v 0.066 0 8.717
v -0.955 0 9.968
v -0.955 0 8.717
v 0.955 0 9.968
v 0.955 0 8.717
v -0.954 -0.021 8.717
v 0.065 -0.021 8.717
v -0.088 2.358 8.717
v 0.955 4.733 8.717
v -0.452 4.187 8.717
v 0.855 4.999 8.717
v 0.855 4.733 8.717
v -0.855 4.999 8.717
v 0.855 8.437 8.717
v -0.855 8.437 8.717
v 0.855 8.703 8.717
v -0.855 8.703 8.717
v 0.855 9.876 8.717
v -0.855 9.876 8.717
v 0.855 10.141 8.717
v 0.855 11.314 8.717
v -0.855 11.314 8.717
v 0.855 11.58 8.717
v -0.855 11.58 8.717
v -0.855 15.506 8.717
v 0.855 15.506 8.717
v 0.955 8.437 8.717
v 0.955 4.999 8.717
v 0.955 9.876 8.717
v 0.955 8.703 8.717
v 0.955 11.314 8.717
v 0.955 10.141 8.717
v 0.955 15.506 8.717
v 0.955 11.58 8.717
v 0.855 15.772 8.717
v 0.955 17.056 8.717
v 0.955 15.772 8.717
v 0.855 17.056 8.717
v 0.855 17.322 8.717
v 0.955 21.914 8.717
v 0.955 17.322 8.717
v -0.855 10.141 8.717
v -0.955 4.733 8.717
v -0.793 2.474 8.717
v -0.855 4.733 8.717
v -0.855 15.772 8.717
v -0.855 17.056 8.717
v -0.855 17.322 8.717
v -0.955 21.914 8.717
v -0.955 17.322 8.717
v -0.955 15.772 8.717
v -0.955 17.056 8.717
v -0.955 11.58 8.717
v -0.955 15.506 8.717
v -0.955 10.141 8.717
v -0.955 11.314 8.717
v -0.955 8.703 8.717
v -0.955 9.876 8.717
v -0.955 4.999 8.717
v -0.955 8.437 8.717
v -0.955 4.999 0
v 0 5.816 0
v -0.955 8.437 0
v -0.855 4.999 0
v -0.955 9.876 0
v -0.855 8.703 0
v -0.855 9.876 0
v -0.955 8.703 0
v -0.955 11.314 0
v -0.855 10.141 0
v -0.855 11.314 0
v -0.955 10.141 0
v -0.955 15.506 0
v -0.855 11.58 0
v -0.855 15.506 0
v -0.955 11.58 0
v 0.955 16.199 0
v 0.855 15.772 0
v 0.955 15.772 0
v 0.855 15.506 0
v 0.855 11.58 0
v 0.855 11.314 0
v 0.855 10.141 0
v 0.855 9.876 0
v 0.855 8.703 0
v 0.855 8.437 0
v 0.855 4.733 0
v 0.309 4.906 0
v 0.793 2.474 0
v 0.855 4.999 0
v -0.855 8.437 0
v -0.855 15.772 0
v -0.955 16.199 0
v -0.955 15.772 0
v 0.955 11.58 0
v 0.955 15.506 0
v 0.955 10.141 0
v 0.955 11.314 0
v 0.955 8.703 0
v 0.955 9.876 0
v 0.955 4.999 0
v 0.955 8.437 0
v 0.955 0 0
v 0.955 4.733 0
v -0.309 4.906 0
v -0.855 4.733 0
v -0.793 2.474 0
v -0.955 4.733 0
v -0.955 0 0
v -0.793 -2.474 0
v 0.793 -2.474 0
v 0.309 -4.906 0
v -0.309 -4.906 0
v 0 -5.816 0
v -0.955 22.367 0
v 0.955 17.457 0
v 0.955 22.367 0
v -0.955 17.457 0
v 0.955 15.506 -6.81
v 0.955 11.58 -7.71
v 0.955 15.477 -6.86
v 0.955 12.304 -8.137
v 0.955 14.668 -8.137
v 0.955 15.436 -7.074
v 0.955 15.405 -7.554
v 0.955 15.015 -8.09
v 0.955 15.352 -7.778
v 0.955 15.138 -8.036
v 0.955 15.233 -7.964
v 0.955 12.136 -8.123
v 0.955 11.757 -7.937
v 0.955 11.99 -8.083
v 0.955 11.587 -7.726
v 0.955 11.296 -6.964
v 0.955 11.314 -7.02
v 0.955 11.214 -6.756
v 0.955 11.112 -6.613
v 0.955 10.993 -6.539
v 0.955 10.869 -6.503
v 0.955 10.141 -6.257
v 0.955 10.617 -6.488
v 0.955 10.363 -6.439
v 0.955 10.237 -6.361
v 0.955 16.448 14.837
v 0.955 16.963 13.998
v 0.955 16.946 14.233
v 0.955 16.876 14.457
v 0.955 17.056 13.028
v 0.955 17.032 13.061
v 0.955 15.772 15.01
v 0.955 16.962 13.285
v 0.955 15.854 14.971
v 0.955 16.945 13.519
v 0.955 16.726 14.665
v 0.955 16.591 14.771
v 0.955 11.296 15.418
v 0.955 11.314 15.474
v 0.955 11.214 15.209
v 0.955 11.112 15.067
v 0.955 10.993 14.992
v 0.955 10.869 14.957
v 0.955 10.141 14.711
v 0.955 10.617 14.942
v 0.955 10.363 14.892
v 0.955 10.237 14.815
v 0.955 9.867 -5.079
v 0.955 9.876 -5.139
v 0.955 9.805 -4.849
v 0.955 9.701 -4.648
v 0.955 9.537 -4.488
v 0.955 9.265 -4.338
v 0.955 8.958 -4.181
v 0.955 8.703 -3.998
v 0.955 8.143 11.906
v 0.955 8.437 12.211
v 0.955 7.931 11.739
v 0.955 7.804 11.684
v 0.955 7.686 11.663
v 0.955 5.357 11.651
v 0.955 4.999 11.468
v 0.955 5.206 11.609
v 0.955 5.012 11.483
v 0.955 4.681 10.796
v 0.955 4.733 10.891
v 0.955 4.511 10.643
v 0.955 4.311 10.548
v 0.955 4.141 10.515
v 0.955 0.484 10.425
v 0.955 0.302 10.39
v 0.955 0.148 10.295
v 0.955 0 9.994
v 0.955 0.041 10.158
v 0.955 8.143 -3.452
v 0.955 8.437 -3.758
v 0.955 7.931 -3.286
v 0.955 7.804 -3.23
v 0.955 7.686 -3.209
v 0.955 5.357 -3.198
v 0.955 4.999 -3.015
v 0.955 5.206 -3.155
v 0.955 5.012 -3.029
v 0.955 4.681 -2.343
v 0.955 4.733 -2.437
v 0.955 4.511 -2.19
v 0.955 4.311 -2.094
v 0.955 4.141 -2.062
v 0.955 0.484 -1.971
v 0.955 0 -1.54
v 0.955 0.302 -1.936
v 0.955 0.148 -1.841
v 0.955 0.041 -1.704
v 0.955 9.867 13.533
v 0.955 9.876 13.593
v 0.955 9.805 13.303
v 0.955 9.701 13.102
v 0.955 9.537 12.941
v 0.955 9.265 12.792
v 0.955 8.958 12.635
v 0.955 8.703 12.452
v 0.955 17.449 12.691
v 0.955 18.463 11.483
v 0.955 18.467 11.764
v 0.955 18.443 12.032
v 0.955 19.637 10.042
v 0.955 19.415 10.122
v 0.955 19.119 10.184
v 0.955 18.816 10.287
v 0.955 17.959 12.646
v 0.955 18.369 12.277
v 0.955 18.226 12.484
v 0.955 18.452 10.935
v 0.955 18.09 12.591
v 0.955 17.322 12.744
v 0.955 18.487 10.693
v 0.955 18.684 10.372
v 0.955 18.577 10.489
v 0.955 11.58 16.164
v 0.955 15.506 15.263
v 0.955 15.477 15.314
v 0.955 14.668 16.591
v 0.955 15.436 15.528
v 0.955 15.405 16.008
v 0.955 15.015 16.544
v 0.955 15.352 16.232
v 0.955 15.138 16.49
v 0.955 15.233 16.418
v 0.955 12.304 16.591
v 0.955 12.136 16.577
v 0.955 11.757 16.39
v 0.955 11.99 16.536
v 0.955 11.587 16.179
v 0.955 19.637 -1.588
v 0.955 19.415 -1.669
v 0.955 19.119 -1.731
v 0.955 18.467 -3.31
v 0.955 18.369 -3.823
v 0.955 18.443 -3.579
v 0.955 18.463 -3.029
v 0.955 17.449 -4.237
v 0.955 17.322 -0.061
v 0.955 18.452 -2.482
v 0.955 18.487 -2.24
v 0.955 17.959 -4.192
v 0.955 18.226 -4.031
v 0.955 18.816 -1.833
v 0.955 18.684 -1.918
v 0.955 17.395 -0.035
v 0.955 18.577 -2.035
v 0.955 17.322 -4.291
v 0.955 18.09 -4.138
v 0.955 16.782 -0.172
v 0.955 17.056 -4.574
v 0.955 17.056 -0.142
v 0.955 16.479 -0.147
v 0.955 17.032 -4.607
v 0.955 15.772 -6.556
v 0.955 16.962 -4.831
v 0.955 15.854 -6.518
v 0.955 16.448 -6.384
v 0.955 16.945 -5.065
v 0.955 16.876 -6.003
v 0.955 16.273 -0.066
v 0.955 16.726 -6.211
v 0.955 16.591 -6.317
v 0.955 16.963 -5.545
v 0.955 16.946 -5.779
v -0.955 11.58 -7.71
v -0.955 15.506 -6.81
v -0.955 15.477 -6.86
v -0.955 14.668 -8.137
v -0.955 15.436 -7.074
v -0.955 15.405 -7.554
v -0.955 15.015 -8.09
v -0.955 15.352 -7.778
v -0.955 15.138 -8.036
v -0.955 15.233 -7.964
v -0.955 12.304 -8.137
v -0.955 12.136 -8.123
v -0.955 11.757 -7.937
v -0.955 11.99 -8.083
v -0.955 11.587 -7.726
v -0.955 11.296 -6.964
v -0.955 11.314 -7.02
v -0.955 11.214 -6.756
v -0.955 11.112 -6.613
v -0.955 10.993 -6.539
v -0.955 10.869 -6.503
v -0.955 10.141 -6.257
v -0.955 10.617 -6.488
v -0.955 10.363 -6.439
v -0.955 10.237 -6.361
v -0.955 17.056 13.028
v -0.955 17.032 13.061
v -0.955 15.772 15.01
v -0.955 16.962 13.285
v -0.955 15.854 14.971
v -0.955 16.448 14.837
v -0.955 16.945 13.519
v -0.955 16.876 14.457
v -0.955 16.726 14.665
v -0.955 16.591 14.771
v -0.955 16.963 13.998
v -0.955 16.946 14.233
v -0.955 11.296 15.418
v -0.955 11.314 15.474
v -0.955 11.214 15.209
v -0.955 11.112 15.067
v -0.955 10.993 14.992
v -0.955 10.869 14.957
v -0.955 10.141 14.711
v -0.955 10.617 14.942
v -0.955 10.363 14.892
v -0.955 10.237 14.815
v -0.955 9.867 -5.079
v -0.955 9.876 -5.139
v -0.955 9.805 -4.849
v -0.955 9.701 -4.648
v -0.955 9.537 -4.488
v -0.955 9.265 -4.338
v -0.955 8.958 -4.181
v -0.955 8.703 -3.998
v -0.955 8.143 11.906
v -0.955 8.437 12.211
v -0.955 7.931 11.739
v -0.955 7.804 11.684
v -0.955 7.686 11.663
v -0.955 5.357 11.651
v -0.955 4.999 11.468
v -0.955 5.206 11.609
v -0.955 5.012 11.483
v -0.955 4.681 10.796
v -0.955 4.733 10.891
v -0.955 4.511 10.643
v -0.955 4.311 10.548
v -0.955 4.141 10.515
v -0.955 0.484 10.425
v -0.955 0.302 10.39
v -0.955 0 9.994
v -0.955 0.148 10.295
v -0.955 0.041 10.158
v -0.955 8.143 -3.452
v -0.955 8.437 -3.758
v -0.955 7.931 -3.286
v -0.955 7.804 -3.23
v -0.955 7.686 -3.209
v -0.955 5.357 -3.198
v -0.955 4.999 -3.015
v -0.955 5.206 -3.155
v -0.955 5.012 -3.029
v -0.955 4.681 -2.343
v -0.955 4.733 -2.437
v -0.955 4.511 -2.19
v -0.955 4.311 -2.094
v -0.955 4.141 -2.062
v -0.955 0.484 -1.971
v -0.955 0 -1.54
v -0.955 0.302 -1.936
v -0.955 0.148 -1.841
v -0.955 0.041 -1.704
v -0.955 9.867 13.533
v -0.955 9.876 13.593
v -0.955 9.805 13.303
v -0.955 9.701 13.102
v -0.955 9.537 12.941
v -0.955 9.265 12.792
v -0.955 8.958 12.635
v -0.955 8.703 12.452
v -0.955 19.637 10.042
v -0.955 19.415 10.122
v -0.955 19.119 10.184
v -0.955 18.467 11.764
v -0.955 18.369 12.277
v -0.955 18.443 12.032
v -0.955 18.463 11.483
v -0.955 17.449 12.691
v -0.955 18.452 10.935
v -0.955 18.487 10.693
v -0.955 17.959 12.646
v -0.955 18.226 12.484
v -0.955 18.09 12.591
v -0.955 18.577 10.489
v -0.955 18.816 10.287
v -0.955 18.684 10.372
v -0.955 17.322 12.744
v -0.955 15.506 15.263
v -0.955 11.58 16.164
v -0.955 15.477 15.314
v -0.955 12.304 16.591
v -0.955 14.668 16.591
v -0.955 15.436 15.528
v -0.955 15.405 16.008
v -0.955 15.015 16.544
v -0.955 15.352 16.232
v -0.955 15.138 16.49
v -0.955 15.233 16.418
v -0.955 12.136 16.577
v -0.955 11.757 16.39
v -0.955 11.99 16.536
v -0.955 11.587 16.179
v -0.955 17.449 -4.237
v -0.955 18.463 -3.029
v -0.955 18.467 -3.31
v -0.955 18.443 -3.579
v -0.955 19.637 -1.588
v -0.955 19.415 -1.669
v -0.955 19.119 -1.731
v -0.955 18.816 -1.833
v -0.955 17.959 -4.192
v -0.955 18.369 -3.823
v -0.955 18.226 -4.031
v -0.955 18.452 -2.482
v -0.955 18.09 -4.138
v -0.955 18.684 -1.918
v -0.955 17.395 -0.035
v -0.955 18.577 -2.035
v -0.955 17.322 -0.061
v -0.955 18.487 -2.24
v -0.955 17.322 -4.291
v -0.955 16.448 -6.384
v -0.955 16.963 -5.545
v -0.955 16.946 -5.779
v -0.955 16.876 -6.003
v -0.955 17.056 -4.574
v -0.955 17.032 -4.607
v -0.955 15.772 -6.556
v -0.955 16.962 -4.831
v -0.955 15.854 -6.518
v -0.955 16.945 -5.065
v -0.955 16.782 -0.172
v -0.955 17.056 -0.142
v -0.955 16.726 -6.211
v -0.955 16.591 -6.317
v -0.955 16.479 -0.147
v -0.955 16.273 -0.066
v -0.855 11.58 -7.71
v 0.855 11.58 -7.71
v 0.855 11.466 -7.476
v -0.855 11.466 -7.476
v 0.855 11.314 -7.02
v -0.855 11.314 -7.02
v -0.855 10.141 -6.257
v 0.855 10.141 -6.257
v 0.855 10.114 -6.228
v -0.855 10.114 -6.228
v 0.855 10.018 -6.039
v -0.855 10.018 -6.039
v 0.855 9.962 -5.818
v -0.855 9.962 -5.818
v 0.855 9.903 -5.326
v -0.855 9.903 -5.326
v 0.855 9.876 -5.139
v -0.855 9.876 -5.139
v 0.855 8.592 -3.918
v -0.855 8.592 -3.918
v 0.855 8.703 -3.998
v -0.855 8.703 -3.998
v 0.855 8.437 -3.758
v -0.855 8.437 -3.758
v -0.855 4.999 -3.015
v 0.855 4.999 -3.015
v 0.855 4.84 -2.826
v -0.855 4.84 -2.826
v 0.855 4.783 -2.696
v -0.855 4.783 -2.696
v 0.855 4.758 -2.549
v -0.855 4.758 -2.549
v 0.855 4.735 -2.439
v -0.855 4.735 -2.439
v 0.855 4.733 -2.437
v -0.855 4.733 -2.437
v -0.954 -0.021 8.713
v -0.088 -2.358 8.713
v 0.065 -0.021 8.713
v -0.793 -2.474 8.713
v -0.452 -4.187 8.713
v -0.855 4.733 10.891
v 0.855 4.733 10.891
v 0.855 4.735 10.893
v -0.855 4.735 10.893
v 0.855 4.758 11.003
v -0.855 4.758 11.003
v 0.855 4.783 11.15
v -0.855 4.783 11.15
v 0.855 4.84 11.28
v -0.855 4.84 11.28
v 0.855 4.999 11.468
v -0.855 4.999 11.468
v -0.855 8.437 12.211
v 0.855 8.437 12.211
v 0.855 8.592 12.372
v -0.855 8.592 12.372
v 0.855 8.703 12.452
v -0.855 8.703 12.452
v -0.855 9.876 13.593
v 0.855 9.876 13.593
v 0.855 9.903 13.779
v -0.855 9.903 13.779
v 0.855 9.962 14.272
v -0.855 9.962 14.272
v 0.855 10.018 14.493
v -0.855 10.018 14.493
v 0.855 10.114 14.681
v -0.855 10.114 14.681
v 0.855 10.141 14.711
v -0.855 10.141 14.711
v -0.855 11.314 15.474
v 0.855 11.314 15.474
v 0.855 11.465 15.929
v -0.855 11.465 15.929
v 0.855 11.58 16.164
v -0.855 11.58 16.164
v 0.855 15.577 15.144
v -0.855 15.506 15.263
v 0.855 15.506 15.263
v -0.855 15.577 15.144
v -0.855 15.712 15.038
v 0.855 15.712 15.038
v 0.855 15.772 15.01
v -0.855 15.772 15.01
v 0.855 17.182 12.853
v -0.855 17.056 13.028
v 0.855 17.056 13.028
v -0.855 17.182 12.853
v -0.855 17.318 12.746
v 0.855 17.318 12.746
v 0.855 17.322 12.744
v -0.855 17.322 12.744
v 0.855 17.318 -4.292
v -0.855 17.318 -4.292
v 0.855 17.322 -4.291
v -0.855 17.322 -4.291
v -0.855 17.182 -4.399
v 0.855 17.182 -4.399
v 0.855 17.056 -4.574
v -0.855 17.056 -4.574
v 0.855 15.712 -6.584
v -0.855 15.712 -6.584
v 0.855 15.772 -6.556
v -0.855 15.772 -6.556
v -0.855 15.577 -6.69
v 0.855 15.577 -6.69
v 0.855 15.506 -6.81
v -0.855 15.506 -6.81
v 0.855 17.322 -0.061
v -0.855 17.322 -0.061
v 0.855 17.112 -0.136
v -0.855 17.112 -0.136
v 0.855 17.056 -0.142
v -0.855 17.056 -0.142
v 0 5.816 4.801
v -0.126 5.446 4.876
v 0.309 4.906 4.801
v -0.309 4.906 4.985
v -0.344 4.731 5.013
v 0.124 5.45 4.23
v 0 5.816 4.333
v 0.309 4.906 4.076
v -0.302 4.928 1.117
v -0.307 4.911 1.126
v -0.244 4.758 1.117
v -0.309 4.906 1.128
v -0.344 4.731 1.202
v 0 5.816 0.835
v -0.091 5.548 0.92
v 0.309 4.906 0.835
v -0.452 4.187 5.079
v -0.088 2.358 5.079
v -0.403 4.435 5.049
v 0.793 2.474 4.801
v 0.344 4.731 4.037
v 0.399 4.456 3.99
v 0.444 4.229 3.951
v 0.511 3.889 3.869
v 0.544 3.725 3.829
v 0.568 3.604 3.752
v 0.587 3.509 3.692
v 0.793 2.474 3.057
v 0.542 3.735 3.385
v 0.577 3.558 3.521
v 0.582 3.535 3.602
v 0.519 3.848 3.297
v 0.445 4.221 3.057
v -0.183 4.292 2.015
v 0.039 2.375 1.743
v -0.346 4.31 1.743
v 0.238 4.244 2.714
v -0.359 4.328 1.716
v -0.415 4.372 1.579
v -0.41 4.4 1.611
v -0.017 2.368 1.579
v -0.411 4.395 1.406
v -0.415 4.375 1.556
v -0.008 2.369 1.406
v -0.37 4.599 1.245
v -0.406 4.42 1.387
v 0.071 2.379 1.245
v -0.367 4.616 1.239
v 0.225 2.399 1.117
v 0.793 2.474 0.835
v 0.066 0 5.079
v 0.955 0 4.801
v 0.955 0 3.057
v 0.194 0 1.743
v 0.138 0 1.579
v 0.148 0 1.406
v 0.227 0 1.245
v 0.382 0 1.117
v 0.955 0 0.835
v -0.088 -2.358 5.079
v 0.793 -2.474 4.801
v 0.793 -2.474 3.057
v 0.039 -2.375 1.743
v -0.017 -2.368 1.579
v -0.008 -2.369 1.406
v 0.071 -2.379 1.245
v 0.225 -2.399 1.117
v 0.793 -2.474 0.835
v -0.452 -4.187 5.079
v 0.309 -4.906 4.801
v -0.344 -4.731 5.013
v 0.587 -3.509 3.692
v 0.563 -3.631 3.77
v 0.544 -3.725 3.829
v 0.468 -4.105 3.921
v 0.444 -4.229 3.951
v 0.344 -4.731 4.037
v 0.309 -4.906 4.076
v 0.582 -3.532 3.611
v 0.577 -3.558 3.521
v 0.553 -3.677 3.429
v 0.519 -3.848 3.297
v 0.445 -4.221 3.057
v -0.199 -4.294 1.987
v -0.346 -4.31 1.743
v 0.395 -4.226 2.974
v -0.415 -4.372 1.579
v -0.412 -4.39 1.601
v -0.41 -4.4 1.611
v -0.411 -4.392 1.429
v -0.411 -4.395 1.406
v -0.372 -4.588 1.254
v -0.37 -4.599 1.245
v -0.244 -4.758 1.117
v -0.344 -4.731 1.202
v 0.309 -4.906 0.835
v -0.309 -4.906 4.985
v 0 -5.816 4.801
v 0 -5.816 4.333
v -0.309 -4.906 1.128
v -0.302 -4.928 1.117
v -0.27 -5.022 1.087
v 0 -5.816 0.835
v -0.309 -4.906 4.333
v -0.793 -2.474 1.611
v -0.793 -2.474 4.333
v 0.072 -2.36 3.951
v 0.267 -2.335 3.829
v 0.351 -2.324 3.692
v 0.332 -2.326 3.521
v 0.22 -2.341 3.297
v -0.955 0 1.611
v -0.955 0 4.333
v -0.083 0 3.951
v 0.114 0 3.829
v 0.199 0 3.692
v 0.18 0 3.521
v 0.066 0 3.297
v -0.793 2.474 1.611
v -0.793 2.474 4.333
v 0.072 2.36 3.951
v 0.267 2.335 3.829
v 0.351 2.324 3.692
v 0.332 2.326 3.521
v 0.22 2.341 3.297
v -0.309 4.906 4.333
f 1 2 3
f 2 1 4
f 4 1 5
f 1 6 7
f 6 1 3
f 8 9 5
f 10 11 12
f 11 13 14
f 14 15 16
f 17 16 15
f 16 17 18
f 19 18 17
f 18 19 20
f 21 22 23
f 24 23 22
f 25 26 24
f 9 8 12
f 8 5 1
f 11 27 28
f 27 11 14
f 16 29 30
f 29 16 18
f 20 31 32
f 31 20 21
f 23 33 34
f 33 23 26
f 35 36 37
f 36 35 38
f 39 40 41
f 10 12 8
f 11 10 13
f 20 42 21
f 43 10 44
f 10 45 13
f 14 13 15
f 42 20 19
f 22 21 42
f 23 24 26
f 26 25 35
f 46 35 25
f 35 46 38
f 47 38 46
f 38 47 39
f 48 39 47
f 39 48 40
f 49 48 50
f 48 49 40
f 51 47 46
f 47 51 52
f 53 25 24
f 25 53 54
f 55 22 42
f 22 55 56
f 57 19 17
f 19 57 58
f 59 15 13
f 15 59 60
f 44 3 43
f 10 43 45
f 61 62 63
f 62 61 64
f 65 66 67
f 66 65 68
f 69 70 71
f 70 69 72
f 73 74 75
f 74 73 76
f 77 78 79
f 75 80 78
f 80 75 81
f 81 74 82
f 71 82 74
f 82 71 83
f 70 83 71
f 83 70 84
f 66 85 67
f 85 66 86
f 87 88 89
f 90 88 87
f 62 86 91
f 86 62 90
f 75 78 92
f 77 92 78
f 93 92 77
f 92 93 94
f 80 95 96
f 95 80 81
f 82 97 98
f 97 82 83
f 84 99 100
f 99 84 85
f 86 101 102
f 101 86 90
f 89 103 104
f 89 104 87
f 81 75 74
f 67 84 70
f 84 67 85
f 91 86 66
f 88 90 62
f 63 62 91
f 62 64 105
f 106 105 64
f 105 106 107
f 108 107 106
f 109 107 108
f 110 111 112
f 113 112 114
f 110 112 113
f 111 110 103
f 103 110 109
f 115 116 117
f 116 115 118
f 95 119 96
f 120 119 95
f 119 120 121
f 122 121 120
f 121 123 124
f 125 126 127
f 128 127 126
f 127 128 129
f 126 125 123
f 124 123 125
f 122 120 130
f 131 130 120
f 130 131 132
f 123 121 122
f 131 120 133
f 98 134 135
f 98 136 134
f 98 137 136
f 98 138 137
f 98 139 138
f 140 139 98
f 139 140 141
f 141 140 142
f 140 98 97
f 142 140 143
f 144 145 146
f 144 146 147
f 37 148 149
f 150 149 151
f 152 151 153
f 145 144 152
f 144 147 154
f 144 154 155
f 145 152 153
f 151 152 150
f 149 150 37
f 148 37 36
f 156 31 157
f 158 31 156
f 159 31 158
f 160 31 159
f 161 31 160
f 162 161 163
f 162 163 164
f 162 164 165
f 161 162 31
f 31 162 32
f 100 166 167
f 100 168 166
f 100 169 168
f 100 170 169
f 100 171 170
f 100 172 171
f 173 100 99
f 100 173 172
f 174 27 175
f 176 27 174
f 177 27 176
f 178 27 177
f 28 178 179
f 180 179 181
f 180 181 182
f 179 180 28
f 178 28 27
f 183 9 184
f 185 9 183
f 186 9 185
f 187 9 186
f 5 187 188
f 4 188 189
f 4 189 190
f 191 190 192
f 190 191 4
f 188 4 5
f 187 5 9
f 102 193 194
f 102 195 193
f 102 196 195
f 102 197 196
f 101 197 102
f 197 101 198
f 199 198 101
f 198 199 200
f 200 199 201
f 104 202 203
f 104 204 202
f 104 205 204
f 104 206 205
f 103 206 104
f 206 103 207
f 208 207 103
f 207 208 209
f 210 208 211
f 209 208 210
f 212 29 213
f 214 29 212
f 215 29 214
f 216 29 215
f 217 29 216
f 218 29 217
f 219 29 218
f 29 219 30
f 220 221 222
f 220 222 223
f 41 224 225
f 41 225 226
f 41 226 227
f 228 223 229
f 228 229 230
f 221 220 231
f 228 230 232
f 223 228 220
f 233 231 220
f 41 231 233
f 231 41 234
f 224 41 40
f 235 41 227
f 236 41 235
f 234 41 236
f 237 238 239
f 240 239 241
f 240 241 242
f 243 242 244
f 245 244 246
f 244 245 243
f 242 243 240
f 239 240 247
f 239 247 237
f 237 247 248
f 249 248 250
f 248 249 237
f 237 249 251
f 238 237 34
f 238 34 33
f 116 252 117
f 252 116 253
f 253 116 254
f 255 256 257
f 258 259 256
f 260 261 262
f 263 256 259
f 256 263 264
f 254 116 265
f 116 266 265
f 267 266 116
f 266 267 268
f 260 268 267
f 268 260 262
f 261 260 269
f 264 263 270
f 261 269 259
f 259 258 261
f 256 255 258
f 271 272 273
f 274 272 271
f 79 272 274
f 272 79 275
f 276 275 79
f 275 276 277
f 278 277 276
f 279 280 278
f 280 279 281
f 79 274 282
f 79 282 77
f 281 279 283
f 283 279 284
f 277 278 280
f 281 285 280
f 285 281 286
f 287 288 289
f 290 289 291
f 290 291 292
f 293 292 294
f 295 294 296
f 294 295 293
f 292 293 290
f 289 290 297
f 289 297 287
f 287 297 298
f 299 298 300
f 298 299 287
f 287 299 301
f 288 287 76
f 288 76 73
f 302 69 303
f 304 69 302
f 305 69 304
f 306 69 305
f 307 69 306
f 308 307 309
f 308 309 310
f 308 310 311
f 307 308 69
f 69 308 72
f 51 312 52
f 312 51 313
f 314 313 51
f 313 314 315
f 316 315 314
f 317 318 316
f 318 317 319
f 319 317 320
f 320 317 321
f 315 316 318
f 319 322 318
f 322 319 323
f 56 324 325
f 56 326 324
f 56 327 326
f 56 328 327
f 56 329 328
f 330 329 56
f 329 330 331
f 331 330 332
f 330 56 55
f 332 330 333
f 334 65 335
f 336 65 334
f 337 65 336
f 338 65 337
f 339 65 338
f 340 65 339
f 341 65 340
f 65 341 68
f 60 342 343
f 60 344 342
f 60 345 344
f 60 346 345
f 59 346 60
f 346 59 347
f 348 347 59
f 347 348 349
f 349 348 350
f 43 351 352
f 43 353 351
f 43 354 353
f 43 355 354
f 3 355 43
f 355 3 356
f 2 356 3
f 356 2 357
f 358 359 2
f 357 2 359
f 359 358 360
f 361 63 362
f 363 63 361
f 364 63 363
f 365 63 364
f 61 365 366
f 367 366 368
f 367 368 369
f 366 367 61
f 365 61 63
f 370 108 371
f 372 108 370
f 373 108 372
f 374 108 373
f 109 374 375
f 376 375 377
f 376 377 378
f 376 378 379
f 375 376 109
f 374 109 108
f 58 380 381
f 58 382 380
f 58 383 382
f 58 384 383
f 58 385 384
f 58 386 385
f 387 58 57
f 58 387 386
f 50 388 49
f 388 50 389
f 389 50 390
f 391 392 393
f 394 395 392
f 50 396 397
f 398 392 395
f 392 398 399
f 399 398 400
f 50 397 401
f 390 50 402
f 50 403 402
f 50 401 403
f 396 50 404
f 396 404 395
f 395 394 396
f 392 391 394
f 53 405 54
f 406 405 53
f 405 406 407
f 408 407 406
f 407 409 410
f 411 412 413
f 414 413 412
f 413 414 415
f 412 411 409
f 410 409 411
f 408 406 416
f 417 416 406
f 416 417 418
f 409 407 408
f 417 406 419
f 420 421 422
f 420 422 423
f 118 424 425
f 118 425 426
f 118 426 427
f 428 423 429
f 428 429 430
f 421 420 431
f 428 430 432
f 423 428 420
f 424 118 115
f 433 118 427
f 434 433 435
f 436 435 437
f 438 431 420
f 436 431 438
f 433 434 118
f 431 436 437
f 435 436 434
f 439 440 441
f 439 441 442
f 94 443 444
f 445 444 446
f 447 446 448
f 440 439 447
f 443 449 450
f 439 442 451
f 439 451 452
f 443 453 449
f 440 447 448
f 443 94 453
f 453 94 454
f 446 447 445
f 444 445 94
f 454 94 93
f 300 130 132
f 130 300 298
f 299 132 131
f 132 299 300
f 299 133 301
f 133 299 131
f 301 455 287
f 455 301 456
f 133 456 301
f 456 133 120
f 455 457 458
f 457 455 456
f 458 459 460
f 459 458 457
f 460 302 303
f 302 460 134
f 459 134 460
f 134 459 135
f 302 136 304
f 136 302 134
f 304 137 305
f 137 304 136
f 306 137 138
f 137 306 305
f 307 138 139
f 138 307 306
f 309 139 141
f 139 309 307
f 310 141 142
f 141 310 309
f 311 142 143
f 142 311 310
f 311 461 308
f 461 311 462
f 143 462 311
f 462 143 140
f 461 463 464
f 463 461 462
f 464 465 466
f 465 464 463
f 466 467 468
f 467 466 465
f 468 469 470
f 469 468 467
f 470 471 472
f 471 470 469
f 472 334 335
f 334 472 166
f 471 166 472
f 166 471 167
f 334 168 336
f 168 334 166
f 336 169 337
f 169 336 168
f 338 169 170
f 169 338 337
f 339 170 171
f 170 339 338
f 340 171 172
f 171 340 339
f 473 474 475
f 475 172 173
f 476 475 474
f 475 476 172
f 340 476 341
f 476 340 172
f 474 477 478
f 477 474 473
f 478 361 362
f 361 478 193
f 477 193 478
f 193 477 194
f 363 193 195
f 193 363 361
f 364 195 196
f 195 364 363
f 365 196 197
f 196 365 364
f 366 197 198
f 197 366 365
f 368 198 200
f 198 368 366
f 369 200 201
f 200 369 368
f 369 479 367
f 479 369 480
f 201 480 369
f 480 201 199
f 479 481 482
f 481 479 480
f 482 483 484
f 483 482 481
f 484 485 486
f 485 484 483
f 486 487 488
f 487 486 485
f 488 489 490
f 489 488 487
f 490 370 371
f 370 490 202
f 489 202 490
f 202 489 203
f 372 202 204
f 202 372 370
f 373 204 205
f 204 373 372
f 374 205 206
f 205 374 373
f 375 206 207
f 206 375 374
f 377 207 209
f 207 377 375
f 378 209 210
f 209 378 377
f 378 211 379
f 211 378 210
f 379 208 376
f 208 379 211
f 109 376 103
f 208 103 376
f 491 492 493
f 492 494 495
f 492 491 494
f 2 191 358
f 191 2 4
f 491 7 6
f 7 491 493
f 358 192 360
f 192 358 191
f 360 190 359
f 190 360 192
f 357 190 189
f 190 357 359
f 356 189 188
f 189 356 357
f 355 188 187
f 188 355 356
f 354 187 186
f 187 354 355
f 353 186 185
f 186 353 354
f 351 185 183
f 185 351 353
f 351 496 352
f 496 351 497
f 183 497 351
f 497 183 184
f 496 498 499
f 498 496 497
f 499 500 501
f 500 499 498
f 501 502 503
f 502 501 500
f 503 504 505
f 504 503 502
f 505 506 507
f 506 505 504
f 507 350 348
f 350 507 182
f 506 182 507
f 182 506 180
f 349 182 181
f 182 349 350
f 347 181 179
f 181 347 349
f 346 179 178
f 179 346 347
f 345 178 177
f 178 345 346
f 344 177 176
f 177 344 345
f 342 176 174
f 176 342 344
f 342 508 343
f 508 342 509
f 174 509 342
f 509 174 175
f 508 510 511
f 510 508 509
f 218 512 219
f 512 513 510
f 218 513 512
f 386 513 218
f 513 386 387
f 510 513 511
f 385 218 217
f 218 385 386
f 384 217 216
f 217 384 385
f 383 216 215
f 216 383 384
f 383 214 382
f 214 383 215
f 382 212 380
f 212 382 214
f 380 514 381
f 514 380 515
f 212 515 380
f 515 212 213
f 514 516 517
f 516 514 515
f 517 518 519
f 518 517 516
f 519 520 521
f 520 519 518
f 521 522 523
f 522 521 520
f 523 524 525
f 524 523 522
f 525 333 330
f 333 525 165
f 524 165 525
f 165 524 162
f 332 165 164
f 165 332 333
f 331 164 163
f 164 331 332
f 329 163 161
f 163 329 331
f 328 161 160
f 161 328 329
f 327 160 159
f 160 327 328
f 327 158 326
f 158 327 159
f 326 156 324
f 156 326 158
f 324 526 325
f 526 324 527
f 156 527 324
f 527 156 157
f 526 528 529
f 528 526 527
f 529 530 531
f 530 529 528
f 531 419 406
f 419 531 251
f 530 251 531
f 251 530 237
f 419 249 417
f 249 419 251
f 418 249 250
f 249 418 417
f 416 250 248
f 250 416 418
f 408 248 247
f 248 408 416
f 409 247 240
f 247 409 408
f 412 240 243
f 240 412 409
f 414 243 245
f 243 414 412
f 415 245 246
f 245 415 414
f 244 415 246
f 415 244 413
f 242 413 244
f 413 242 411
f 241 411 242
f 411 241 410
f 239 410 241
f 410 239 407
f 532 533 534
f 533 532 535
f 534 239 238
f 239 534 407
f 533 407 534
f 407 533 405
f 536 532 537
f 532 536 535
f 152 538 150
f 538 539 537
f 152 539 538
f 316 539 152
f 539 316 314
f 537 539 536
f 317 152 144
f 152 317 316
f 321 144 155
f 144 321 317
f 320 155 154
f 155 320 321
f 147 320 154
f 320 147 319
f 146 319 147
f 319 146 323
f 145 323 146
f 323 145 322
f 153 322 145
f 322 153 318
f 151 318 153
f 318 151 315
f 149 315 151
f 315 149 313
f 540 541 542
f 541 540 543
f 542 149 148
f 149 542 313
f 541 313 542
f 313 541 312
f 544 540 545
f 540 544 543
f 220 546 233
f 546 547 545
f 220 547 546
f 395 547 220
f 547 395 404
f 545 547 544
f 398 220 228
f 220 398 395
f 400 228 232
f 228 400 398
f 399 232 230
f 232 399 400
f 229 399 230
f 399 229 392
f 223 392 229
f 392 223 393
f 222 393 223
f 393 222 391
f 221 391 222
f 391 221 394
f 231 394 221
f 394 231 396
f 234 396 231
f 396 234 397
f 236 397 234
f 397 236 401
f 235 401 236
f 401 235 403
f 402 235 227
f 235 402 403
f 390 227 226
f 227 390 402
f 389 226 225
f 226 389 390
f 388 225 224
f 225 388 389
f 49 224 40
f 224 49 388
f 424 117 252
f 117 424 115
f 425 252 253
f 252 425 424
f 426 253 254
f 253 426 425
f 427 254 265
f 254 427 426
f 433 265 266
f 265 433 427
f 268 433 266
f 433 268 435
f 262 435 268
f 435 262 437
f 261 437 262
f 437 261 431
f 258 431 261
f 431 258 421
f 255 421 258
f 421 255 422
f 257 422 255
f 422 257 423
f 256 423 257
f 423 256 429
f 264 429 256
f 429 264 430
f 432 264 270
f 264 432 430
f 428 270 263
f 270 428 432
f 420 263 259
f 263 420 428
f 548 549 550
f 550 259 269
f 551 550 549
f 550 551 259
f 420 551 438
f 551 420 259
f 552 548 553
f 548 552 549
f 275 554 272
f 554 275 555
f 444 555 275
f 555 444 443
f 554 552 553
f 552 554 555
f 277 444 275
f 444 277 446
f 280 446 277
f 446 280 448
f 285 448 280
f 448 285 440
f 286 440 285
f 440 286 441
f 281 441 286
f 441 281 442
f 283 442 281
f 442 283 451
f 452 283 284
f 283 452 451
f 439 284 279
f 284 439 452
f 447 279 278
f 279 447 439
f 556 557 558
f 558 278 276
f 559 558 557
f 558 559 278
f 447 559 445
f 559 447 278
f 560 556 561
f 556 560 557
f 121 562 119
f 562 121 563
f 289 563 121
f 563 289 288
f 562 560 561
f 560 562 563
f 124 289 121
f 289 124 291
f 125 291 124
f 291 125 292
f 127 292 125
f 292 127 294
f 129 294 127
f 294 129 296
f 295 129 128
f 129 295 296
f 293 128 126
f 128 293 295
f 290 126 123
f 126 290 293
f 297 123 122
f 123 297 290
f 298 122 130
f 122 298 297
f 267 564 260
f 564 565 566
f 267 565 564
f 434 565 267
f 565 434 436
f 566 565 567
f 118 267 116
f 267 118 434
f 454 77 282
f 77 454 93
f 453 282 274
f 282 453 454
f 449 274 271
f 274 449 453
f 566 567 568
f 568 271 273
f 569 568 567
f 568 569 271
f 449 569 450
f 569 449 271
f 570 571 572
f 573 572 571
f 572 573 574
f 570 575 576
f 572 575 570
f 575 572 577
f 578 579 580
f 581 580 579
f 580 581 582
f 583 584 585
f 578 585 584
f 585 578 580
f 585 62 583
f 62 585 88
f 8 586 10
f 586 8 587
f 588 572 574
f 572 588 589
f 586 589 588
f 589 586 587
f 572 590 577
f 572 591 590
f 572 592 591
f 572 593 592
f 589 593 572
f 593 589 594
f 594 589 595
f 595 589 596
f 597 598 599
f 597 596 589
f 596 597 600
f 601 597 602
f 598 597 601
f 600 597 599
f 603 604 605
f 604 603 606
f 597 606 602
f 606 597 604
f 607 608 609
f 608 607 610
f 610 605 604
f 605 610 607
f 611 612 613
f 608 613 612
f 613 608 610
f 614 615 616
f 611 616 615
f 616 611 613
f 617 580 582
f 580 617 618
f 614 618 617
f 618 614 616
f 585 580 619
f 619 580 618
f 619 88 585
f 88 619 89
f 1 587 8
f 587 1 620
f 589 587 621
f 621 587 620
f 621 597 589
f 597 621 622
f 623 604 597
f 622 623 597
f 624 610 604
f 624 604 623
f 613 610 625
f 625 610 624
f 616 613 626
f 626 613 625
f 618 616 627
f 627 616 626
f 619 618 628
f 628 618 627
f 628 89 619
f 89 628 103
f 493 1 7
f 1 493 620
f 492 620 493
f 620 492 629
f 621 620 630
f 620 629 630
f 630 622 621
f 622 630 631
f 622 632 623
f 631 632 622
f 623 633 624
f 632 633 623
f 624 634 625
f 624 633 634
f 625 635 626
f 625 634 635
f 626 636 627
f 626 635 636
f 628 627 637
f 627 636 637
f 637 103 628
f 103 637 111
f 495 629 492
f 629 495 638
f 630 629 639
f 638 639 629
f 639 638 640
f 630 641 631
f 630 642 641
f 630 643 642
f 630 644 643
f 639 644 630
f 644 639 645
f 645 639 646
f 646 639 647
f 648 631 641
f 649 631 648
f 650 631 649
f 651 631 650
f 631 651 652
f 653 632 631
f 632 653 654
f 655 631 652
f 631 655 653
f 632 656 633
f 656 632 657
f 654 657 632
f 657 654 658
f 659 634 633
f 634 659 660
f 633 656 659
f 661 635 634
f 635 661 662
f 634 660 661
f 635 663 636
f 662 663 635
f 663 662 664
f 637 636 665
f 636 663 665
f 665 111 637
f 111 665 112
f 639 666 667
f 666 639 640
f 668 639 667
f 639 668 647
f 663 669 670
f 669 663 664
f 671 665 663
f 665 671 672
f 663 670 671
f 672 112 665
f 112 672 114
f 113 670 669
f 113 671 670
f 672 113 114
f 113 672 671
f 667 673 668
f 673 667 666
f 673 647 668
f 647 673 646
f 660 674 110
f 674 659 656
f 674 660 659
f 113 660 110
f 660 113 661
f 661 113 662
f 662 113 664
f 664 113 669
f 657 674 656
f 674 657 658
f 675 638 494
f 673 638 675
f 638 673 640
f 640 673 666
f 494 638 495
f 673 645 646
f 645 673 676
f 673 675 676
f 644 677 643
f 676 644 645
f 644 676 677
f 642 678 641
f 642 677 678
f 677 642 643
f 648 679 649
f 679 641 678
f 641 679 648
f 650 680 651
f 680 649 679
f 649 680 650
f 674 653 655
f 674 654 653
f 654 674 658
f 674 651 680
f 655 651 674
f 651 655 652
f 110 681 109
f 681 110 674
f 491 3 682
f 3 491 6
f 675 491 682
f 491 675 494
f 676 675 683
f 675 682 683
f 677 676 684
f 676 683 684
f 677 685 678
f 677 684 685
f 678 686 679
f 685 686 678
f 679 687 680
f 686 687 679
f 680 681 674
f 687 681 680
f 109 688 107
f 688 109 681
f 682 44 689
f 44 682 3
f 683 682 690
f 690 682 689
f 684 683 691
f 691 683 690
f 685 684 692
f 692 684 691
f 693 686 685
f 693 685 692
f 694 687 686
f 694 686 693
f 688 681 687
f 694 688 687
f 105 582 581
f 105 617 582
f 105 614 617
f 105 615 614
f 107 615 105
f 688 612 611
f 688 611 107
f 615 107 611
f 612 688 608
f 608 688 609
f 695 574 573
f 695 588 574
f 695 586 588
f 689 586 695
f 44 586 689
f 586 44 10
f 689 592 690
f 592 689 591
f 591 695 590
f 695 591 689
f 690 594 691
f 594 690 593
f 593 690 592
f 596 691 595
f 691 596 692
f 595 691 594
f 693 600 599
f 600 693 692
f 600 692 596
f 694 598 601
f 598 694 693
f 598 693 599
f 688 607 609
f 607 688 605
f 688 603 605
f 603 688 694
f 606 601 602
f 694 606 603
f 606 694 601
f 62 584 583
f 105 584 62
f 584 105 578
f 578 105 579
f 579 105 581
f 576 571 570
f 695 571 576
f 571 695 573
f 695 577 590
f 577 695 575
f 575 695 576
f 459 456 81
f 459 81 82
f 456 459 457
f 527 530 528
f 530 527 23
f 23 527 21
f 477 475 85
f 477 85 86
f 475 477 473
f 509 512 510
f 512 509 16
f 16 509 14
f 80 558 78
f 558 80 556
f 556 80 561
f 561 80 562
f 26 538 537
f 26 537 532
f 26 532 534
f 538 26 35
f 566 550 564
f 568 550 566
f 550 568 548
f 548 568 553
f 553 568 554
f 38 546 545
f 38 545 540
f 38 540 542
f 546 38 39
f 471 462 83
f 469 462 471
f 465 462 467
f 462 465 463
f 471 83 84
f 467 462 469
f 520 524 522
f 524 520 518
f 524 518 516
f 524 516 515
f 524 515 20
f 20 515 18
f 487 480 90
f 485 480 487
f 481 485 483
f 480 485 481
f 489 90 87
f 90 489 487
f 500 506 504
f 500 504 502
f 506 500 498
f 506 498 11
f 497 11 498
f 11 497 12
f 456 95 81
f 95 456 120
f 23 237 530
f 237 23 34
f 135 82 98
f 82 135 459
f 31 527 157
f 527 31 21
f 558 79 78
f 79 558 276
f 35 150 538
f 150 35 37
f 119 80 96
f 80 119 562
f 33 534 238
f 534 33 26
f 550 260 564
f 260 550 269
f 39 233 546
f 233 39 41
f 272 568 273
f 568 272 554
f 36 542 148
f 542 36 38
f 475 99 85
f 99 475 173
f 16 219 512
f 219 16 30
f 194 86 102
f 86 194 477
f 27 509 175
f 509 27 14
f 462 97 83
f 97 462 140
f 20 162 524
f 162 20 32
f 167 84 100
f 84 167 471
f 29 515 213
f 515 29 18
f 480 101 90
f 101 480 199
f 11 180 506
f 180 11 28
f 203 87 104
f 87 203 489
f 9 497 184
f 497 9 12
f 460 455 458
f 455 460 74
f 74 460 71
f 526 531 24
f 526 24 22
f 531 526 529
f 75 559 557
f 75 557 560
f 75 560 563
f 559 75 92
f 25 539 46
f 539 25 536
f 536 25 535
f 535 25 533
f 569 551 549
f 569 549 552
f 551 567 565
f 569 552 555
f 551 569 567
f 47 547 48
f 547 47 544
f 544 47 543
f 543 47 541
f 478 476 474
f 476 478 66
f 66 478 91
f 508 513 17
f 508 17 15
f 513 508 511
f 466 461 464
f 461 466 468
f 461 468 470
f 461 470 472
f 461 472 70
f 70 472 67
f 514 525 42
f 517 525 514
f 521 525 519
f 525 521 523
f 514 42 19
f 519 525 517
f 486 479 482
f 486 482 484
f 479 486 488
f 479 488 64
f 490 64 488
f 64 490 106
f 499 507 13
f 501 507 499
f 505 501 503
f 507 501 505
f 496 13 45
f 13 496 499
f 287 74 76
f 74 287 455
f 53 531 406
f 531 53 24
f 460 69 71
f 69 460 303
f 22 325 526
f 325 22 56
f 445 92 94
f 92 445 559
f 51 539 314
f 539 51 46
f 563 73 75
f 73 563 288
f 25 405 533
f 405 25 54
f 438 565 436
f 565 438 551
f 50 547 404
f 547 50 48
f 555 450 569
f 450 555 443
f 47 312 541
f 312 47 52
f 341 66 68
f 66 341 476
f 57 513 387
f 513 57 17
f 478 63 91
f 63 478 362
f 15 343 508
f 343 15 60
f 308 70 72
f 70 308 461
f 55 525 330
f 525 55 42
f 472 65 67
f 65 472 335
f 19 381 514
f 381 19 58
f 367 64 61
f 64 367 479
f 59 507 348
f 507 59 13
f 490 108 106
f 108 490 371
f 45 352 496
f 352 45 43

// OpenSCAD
// file: keygen.scad
$inf=1000;
$eps=.01;

function key_move(points, offset) = [
    for(p=points) [p[0] + offset[0],
                   p[1] + offset[1]]
];

module key_outline(outline_points, thickness, outline_paths=undef) {
    rotate(-90, [0, 1, 0]) rotate(-90, [0, 0, 1]) // Rotate into the correct plane
        linear_extrude(height=thickness, center=true) // Extrude the key outline
            polygon(points=outline_points, paths=outline_paths); // Draw the outline
}

module key_blade(warding, plug_diameter=0) {
    // Draw the blade to infinity in -Y
    // optionally intersected with the plug cylinder
    // to round the bottom
    intersection() {
        rotate(90, [1, 0, 0])
            linear_extrude(height=2*$inf, center=true)
                polygon(warding);

        // Draw the plug, if a plug diameter is specified
        if(plug_diameter > 0) {
            // Draw infinite cylinder in -Y
            translate([0, 0, 0.5*plug_diameter]) rotate(90, [1, 0, 0])
                cylinder(r=0.5*plug_diameter, h=$inf, $fn=$fn ? 4*$fn : 48);
        }
    }
}

module key_x_line(length) {
    // Hack to draw a line in X
    // since OpenSCAD does not support line primitives
    // Take a 2D square and rotate it
    // When it is orthogonal to the XY plane,
    // it projects down to a line
    rotate(90, [1, 0, 0])
    square([length, length], center=true);
}

module key_warding_cutter(warding, blade_height, cutter_radius, left) {
    neg = left ? -1 : 1;
    translate([neg * -cutter_radius, 0, 0])
        rotate_extrude($fn=$fn ? 4*$fn : 48)
            translate([neg * cutter_radius, 0])
                difference() {
                    translate([0, 0.5*blade_height])
                        square([2 * cutter_radius, blade_height], center=true);
                    minkowski() {
                        translate([neg * 1.5 * cutter_radius, 0])
                            key_x_line(3 * cutter_radius);
                        polygon(warding);
                    }
                    polygon(warding);
                }
}

module key_emboss(emboss_points, emboss_depth, left, thickness, emboss_paths=undef) {
    translate([(left ? -1 : 1) * 0.5*thickness, 0, 0]) rotate(-90, [0, 1, 0]) rotate(-90, [0, 0, 1]) // Translate and rotate into the correct soot
        linear_extrude(height=2*emboss_depth, center=true) // Extrude the key outline
            polygon(points=emboss_points, paths=emboss_paths); // Draw the outline
}

module key_blank(outline_points,
                warding,
                outline_paths=undef,
                emboss_right_points=[],
                emboss_right_paths=undef,
                emboss_left_points=[],
                emboss_left_paths=undef,
                bow_thickness=0,
                emboss_depth=.1,
                plug_diameter=0,
                offset=[0, 0],
                cutter_radius=18) {

    // Find the bounding box of the warding
    warding_min = [min([for(e=warding) e[0]]), min([for(e=warding) e[1]])];
    warding_max = [max([for(e=warding) e[0]]), max([for(e=warding) e[1]])];

    // Apply the given offset to the outline,
    // holes, and emboss
    outline_adj = key_move(outline_points, offset);
    emboss_left_adj = key_move(emboss_left_points, offset);
    emboss_right_adj = key_move(emboss_right_points, offset);

    // Move the warding profile
    // so that it is centered in X
    // and non-negative in Y
    warding_offset = [-0.5 * (warding_min[0] + warding_max[0]),
                      -warding_min[1]];
    warding_adj = key_move(warding, warding_offset);

    // Infer various key properties
    thickness = (bow_thickness == 0) ? abs(warding_max[0] - warding_min[0]) : bow_thickness;
    blade_height = abs(warding_max[1] - warding_min[1]);

    // Cut out the warding milling artifacts
    // from the bow
    difference() {
        // Create the bulk of the keyblank
        // by intersecting the outline
        // with the warding profile
        // and the plug
        intersection() {
            // Draw the key outline and holes
            key_outline(outline_adj, thickness, outline_paths);
            
            // Draw the blade, and a giant box where the bow is
            // so that we don't wipe out the bow
            // when the intersection happens
            union() {
                // Fill +Y half-space
                translate([0, $inf/2, 0])
                    cube([$inf, $inf, $inf], center=true);

                key_blade(warding_adj, plug_diameter);
            }
        }
        // Draw the milling wheels that cut the warding
        if(cutter_radius != 0) {
            key_warding_cutter(warding_adj, blade_height, cutter_radius, false);
            key_warding_cutter(warding_adj, blade_height, cutter_radius, true);
        }

        // Draw the embossing
        key_emboss(emboss_right_adj, emboss_depth, false, thickness, emboss_right_paths);
        key_emboss(emboss_left_adj, emboss_depth, true, thickness, emboss_left_paths);
    }
}
// main file
use <keygen.scad>
include <sc4.gen.scad>

key_blank(outline_points,
          warding_points,
          outline_paths=outline_paths,
          emboss_right_points=emboss_points,
          emboss_right_paths=emboss_paths,
          emboss_left_points=emboss_points,
          emboss_left_paths=emboss_paths,
          offset=-outline_points[187]);
